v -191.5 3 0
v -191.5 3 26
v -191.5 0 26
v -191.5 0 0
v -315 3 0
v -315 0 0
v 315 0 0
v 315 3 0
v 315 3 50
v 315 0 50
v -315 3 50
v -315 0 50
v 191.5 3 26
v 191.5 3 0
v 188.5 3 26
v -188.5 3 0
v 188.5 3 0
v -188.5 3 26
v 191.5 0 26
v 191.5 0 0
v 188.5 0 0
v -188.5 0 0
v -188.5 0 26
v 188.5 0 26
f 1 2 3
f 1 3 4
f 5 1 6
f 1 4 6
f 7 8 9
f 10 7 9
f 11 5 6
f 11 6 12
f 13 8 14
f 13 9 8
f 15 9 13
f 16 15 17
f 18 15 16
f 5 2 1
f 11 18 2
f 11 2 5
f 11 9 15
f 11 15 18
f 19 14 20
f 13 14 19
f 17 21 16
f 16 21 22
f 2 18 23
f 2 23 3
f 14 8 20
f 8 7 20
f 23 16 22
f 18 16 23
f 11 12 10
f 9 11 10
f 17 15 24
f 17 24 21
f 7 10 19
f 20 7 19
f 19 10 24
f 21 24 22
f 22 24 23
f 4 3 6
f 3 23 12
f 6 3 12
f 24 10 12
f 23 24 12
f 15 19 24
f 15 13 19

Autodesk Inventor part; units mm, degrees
ref_plane "YZ Plane" through (0, 0, 0) normal (1, 0, 0) x (0, 1, 0)
ref_plane "XZ Plane" through (0, 0, 0) normal (0, 1, 0) x (-1, 0, 0)
ref_plane "XY Plane" through (0, 0, 0) normal (0, 0, 1) x (1, 0, 0)
sketch "Sketch2" plane through (0, 0, 0) normal (0, 1, 0) x (-1, 0, 0)
  line L0 (375, 50) -> (-375, 50)
  line L1 (-375, 50) -> (-375, 0)
  line L2 (-375, 0) -> (375, 0)
  line L3 (375, 0) -> (375, 50)
  circle A0 centre (-375, 0) radius 22.5
  circle A1 centre (375, 0) radius 22.5
  point P0 (0, 0)
  point P1 (0, 0)
  point P2 (-375, 22.5)
  point P3 (-352.5, 0)
  point P4 (352.5, 0)
  point P5 (375, 22.5)
  dimension "d18" = 750
  dimension "d19" = 50
  dimension "d20" = 45
extrude "Plate2" add sketch "Sketch2" along normal blind 3 contours L3 A1 L2 A0 L1 L0 | L3 L2 A1 | A0 L2 L1 picked at (360.188, 1.6689) picked at (-360.9308, 4.923)
sketch "Sketch3" plane through (0, 3, 0) normal (0, 1, 0) x (1, 0, 0)
  line L0 (-190, 0) -> (-190, -50) construction
  line L1 (-375, -50) -> (375, -50) projected
  line L2 (-375, -50) -> (-375, 0) projected
  line L3 (-191.5, 0) -> (-188.5, 0)
  line L4 (-188.5, 0) -> (-188.5, -26)
  line L5 (-188.5, -26) -> (-191.5, -26)
  line L6 (-191.5, -26) -> (-191.5, 0)
  line L7 (-375, 0) -> (375, 0) projected
  line L8 (375, 0) -> (-375, 0) projected
  line L9 (190, 0) -> (190, -50) construction
  line L10 (191.5, -26) -> (188.5, -26)
  line L11 (188.5, -26) -> (188.5, 0)
  line L12 (188.5, 0) -> (191.5, 0)
  line L13 (191.5, 0) -> (191.5, -26)
  point P0 (0, 0)
  point P1 (0, 0)
  point P2 (0, 0)
  point P3 (188.5, 0)
  dimension "d23" = 3
  dimension "d24" = 26
  dimension "d30" = 190
  dimension "d31" = 190
  dimension "d32" = 3
  dimension "d33" = 26
extrude "Extrusion1" cut sketch "Sketch3" against normal through all
sketch "Sketch4" plane through (0, 3, 0) normal (0, 1, 0) x (1, 0, 0)
  line L0 (-188.5, 0) -> (-188.5, -26) projected
  line L1 (-188.5, -26) -> (-191.5, -26) projected
  line L2 (-191.5, -26) -> (-191.5, 0) projected
  line L3 (-375, 0) -> (-191.5, 0) projected
  line L4 (-375, -50) -> (-375, 0) projected
  line L5 (375, -50) -> (-375, -50) projected
  line L6 (375, 0) -> (375, -50) projected
  line L7 (191.5, 0) -> (375, 0) projected
  line L8 (191.5, 0) -> (191.5, -26) projected
  line L9 (191.5, -26) -> (188.5, -26) projected
  line L10 (188.5, -26) -> (188.5, 0) projected
  line L11 (-188.5, 0) -> (188.5, 0) projected
  line L12 (-191.5, 0) -> (-375, 0) projected
  line L13 (-315, 0) -> (-315, -50)
  line L14 (315, 0) -> (315, -50)
  line L15 (-375, -50) -> (375, -50) projected
  point P0 (0, 0)
  dimension "d35" = 60
  dimension "d36" = 60
extrude "Extrusion2" cut sketch "Sketch4" against normal through all contours L13 L5 L4 L3 | L7 L6 L5 L14
sketch "Sketch5" plane through (0, 0, 0) normal (0, -1, 0) x (1, 0, 0)
  line L0 (-57.747, 1.3029) -> (-57.747, 31.8939) construction
  line L1 (-57.747, 31.8939) -> (64.2813, 31.8939) construction
  line L2 (64.2813, 31.8939) -> (64.2813, 1.3029) construction
  line L3 (64.2813, 1.3029) -> (-57.747, 1.3029) construction
  point P0 (0, 0)
mark "Mark1"
equation "\"d23\" = Thickness"
equation "\"d31\" = d30"
equation "\"d32\" = Thickness"
equation "\"d33\" = d24"
equation "\"d36\" = d35"
equation "\"d21\" = Thickness"
equation "\"BendReliefWidth\" = Thickness"
equation "\"BendReliefDepth\" = 0.5 * Thickness"
equation "\"CornerReliefSize\" = 4 * Thickness"
equation "\"MinimumRemnant\" = 2 * Thickness"
equation "\"TransitionRadius\" = BendRadius"
equation "\"JacobiRadiusSize\" = BendRadius"
equation "\"GapSize\" = Thickness"
equation "\"Thickness\" = 3"
equation "\"BendRadius\" = 5"
properties part number "MSC 107 rib cone" material "Stainless Steel"
